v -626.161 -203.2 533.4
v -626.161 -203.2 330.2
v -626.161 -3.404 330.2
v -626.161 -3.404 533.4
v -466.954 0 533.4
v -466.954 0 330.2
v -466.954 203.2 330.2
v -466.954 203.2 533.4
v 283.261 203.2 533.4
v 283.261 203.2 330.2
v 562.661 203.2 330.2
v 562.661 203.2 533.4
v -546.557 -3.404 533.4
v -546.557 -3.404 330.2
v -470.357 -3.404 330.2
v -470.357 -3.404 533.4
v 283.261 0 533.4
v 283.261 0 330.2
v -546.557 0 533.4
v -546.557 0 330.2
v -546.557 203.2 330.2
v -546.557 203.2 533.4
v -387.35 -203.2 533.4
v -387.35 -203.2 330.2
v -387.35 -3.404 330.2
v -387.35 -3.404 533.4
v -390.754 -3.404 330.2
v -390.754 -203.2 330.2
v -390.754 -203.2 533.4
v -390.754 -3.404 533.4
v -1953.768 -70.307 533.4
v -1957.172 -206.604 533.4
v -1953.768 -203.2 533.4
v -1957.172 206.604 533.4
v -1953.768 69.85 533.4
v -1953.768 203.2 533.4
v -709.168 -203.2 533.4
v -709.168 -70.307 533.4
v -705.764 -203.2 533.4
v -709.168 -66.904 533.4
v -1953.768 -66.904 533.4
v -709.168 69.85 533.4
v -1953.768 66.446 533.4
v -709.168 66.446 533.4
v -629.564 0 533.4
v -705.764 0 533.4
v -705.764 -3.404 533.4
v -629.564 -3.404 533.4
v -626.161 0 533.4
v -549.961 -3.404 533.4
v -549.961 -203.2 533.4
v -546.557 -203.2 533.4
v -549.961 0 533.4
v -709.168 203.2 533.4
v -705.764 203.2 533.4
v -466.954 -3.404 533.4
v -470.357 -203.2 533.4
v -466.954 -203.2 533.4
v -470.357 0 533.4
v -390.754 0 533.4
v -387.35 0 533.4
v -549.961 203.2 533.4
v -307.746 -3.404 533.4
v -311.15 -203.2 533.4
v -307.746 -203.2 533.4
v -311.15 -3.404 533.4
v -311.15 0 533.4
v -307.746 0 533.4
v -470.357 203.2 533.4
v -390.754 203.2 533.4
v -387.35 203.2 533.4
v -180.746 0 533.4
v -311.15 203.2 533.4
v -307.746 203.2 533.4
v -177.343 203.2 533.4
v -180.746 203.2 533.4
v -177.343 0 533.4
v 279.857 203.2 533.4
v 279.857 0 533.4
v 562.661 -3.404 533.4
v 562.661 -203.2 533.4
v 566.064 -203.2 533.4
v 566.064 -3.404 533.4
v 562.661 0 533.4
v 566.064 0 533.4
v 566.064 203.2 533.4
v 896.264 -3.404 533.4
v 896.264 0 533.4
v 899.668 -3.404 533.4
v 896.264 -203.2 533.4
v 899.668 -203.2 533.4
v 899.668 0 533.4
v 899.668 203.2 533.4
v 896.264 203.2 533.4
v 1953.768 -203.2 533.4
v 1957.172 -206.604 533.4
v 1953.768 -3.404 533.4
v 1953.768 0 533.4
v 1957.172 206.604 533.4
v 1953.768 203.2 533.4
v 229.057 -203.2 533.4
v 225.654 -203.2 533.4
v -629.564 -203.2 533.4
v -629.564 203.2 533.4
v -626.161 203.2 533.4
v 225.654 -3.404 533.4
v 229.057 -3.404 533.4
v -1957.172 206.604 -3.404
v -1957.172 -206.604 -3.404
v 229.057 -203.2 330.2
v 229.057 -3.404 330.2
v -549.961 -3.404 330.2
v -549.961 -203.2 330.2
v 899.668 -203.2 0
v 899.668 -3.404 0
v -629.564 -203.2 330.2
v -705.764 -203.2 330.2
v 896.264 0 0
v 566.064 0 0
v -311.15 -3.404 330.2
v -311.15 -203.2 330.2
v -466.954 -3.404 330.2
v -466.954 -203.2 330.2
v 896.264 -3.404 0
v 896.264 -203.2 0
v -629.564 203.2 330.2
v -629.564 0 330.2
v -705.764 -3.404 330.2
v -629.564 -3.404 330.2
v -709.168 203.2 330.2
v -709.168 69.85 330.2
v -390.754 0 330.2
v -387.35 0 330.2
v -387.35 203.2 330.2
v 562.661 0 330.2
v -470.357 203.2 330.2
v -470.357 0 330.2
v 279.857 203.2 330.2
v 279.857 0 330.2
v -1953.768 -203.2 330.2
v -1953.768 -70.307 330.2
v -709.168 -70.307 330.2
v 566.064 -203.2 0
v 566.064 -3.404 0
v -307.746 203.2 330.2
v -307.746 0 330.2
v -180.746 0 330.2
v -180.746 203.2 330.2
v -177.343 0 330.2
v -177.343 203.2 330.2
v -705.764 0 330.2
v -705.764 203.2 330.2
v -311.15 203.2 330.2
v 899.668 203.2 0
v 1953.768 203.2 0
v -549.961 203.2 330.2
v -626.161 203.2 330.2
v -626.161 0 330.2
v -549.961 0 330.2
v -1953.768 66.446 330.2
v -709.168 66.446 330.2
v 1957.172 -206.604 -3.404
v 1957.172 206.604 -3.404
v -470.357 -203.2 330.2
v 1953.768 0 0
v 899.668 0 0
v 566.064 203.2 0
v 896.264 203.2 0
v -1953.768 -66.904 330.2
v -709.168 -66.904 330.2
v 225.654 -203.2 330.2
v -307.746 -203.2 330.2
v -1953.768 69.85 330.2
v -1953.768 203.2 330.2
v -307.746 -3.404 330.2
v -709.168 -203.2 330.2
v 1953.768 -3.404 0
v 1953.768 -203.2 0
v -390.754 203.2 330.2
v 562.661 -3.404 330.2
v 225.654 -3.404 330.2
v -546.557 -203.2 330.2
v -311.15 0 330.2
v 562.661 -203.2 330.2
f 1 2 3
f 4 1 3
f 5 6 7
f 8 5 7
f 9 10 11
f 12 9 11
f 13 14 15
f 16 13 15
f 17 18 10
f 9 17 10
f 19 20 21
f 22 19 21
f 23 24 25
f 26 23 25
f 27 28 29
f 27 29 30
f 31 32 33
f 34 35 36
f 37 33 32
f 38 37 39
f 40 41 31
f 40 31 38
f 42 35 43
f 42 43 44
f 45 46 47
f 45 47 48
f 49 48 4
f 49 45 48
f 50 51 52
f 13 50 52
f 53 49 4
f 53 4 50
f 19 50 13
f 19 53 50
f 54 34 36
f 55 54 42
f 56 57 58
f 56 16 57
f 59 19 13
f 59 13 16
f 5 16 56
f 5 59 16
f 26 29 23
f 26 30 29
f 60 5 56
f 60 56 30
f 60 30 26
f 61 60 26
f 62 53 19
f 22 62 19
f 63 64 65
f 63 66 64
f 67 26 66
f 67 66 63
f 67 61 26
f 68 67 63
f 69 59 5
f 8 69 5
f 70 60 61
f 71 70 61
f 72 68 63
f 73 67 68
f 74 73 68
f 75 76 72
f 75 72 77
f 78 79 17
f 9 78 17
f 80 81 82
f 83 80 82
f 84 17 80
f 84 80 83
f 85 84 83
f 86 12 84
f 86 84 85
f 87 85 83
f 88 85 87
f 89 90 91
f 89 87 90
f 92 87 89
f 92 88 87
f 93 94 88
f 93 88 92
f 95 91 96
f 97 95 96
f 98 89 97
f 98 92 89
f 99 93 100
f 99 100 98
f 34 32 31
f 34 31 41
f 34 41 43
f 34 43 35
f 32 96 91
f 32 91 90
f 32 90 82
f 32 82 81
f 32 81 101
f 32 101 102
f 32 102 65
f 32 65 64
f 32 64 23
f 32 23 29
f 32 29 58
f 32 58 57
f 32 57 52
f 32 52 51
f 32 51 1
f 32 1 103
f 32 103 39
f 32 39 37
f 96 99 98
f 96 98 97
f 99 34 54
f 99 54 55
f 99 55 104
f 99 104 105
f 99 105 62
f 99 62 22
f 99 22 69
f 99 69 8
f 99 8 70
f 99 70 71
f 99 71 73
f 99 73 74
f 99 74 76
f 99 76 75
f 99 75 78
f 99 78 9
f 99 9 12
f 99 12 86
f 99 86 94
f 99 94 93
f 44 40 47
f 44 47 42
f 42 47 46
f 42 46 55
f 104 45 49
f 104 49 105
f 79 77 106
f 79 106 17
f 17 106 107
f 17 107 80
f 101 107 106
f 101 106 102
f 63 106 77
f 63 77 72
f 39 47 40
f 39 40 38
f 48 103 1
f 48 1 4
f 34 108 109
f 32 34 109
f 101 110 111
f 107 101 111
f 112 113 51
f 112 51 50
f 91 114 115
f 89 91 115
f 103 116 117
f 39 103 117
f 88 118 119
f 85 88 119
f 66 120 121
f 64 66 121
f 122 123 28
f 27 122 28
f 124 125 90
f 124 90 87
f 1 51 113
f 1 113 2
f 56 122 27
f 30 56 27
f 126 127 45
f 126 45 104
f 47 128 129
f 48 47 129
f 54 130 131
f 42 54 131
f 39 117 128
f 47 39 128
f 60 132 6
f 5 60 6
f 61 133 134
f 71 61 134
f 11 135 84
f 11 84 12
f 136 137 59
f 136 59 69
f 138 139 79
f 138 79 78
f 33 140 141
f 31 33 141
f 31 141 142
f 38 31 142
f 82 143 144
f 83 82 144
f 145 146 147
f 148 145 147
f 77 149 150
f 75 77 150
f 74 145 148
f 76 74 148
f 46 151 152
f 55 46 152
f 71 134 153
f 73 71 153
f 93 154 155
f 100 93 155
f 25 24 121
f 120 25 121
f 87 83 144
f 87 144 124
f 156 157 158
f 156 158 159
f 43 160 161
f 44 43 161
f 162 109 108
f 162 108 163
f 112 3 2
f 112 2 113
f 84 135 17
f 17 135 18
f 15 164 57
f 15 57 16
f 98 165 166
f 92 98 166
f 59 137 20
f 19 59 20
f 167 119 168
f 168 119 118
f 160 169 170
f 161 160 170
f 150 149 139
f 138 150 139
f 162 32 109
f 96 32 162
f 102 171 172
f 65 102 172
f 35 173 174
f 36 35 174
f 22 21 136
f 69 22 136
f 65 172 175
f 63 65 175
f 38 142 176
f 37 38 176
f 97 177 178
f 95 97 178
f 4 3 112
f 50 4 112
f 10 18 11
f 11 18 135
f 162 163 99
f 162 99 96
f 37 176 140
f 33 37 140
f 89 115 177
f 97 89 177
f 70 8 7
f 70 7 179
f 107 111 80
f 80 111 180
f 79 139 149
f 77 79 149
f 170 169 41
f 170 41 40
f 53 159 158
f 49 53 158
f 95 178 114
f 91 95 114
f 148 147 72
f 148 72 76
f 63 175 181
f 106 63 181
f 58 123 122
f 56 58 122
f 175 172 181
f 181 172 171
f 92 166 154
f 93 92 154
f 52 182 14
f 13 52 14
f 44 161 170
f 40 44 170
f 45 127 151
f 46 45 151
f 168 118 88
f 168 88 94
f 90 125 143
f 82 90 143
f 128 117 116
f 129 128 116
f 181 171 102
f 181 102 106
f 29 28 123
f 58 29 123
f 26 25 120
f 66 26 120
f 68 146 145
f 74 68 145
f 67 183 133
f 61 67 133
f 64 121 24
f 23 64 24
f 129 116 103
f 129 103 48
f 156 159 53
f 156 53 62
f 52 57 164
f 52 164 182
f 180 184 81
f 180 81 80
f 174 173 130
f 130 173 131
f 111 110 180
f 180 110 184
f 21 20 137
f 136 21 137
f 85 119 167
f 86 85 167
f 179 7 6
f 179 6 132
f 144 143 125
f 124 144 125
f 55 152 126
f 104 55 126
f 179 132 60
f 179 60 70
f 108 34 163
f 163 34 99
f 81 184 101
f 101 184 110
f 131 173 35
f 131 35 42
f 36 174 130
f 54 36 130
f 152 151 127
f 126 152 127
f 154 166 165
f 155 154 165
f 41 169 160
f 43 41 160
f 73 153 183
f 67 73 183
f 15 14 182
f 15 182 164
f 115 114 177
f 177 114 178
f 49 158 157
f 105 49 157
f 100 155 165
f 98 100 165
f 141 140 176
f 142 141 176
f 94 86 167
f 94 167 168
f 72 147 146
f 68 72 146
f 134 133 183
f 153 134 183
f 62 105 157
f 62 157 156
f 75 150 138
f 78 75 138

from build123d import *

# Parameters (mm, degrees)
F0_W     = 3914.3432
F0_H     = 413.2072
F0_W_2   = 1244.6
F0_H_2   = 3.4036
F0_W_3   = 3.4036
F0_H_3   = 203.2
F0_H_4   = 199.7964
F1_DEPTH = 533.4
F2_W     = 3914.3432
F2_H     = 413.2072
F3_DEPTH = 3.4036
F4_DEPTH = 330.2


with BuildPart() as f1:
    # F0 (on Top) → F1 (new body)
    with BuildSketch(Plane.XY):
        Rectangle(F0_W, F0_H)
        Polygon((-1953.768, 69.85), (-1953.768, 203.2), (-709.168, 203.2), (-705.7644, 203.2), (-629.5644, 203.2), (-626.1608, 203.2), (-549.9608, 203.2), (-546.5572, 203.2), (-470.3572, 203.2), (-466.9536, 203.2), (-390.7536, 203.2), (-387.35, 203.2), (-311.15, 203.2), (-307.7464, 203.2), (-180.7464, 203.2), (-177.3428, 203.2), (279.8572, 203.2), (283.2608, 203.2), (562.6608, 203.2), (566.0644, 203.2), (896.2644, 203.2), (899.668, 203.2), (1953.768, 203.2), (1953.768, 0), (1953.768, -3.4036), (1953.768, -203.2), (899.668, -203.2), (896.2644, -203.2), (566.0644, -203.2), (562.6608, -203.2), (229.0572, -203.2), (225.6536, -203.2), (-307.7464, -203.2), (-311.15, -203.2), (-387.35, -203.2), (-390.7536, -203.2), (-466.9536, -203.2), (-470.3572, -203.2), (-546.5572, -203.2), (-549.9608, -203.2), (-626.1608, -203.2), (-629.5644, -203.2), (-705.7644, -203.2), (-709.168, -203.2), (-1953.768, -203.2), (-1953.768, -70.3072), (-1953.768, -66.9036), (-1953.768, 66.4464), align=None, mode=Mode.SUBTRACT)
        with Locations((-1331.468, 68.1482)):
            Rectangle(F0_W_2, F0_H_2)
        with Locations((-1331.468, -68.6054)):
            Rectangle(F0_W_2, F0_H_2)
        Polygon((-705.7644, 203.2), (-709.168, 203.2), (-709.168, 69.85), (-709.168, 66.4464), (-709.168, -66.9036), (-709.168, -70.3072), (-709.168, -203.2), (-705.7644, -203.2), (-705.7644, -3.4036), (-705.7644, 0), align=None)
        Polygon((-629.5644, 0), (-705.7644, 0), (-705.7644, -3.4036), (-629.5644, -3.4036), (-626.1608, -3.4036), (-549.9608, -3.4036), (-546.5572, -3.4036), (-470.3572, -3.4036), (-466.9536, -3.4036), (-390.7536, -3.4036), (-387.35, -3.4036), (-311.15, -3.4036), (-311.15, 0), (-387.35, 0), (-390.7536, 0), (-466.9536, 0), (-470.3572, 0), (-546.5572, 0), (-549.9608, 0), (-626.1608, 0), align=None)
        with Locations((-627.8626, 101.6)):
            Rectangle(F0_W_3, F0_H_3)
        with Locations((-627.8626, -103.3018)):
            Rectangle(F0_W_3, F0_H_4)
        with Locations((-548.259, -103.3018)):
            Rectangle(F0_W_3, F0_H_4)
        with Locations((-548.259, 101.6)):
            Rectangle(F0_W_3, F0_H_3)
        with Locations((-468.6554, 101.6)):
            Rectangle(F0_W_3, F0_H_3)
        with Locations((-468.6554, -103.3018)):
            Rectangle(F0_W_3, F0_H_4)
        with Locations((-389.0518, -103.3018)):
            Rectangle(F0_W_3, F0_H_4)
        with Locations((-389.0518, 101.6)):
            Rectangle(F0_W_3, F0_H_3)
        Polygon((-307.7464, 203.2), (-311.15, 203.2), (-311.15, 0), (-311.15, -3.4036), (-311.15, -203.2), (-307.7464, -203.2), (-307.7464, -3.4036), (-307.7464, 0), align=None)
        Polygon((-180.7464, 0), (-307.7464, 0), (-307.7464, -3.4036), (225.6536, -3.4036), (229.0572, -3.4036), (562.6608, -3.4036), (566.0644, -3.4036), (896.2644, -3.4036), (899.668, -3.4036), (1953.768, -3.4036), (1953.768, 0), (899.668, 0), (896.2644, 0), (566.0644, 0), (562.6608, 0), (283.2608, 0), (279.8572, 0), (-177.3428, 0), align=None)
        with Locations((-179.0446, 101.6)):
            Rectangle(F0_W_3, F0_H_3)
        with Locations((281.559, 101.6)):
            Rectangle(F0_W_3, F0_H_3)
        with Locations((227.3554, -103.3018)):
            Rectangle(F0_W_3, F0_H_4)
        with Locations((564.3626, -103.3018)):
            Rectangle(F0_W_3, F0_H_4)
        with Locations((564.3626, 101.6)):
            Rectangle(F0_W_3, F0_H_3)
        with Locations((897.9662, 101.6)):
            Rectangle(F0_W_3, F0_H_3)
        with Locations((897.9662, -103.3018)):
            Rectangle(F0_W_3, F0_H_4)
    extrude(amount=F1_DEPTH)

    # F2 (on face) → F3 (join)
    with BuildSketch(Plane(origin=(0, 0, 0), x_dir=(1, 0, 0), z_dir=(0, 0, -1))):
        Rectangle(F2_W, F2_H)
    extrude(amount=F3_DEPTH)

    # F4 (add): faces of the model
    f4_faces = [f1.faces().sort_by_distance(p)[0] for p in [
        (-1331.468, 136.525, 0),
        (-1331.468, -0.2286, 0),
        (-1331.468, -136.7536, 0),
        (-667.6644, 101.6, 0),
        (-588.0608, 101.6, 0),
        (-508.4572, 101.6, 0),
        (-428.8536, 101.6, 0),
        (-349.25, 101.6, 0),
        (-349.25, -103.3018, 0),
        (-428.8536, -103.3018, 0),
        (-508.4572, -103.3018, 0),
        (-588.0608, -103.3018, 0),
        (-667.6644, -103.3018, 0),
        (-41.0464, -103.3018, 0),
        (-244.2464, 101.6, 0),
        (51.2572, 101.6, 0),
        (422.9608, 101.6, 0),
        (395.859, -103.3018, 0),
    ]]
    extrude(f4_faces, amount=F4_DEPTH)


solid = f1.part
